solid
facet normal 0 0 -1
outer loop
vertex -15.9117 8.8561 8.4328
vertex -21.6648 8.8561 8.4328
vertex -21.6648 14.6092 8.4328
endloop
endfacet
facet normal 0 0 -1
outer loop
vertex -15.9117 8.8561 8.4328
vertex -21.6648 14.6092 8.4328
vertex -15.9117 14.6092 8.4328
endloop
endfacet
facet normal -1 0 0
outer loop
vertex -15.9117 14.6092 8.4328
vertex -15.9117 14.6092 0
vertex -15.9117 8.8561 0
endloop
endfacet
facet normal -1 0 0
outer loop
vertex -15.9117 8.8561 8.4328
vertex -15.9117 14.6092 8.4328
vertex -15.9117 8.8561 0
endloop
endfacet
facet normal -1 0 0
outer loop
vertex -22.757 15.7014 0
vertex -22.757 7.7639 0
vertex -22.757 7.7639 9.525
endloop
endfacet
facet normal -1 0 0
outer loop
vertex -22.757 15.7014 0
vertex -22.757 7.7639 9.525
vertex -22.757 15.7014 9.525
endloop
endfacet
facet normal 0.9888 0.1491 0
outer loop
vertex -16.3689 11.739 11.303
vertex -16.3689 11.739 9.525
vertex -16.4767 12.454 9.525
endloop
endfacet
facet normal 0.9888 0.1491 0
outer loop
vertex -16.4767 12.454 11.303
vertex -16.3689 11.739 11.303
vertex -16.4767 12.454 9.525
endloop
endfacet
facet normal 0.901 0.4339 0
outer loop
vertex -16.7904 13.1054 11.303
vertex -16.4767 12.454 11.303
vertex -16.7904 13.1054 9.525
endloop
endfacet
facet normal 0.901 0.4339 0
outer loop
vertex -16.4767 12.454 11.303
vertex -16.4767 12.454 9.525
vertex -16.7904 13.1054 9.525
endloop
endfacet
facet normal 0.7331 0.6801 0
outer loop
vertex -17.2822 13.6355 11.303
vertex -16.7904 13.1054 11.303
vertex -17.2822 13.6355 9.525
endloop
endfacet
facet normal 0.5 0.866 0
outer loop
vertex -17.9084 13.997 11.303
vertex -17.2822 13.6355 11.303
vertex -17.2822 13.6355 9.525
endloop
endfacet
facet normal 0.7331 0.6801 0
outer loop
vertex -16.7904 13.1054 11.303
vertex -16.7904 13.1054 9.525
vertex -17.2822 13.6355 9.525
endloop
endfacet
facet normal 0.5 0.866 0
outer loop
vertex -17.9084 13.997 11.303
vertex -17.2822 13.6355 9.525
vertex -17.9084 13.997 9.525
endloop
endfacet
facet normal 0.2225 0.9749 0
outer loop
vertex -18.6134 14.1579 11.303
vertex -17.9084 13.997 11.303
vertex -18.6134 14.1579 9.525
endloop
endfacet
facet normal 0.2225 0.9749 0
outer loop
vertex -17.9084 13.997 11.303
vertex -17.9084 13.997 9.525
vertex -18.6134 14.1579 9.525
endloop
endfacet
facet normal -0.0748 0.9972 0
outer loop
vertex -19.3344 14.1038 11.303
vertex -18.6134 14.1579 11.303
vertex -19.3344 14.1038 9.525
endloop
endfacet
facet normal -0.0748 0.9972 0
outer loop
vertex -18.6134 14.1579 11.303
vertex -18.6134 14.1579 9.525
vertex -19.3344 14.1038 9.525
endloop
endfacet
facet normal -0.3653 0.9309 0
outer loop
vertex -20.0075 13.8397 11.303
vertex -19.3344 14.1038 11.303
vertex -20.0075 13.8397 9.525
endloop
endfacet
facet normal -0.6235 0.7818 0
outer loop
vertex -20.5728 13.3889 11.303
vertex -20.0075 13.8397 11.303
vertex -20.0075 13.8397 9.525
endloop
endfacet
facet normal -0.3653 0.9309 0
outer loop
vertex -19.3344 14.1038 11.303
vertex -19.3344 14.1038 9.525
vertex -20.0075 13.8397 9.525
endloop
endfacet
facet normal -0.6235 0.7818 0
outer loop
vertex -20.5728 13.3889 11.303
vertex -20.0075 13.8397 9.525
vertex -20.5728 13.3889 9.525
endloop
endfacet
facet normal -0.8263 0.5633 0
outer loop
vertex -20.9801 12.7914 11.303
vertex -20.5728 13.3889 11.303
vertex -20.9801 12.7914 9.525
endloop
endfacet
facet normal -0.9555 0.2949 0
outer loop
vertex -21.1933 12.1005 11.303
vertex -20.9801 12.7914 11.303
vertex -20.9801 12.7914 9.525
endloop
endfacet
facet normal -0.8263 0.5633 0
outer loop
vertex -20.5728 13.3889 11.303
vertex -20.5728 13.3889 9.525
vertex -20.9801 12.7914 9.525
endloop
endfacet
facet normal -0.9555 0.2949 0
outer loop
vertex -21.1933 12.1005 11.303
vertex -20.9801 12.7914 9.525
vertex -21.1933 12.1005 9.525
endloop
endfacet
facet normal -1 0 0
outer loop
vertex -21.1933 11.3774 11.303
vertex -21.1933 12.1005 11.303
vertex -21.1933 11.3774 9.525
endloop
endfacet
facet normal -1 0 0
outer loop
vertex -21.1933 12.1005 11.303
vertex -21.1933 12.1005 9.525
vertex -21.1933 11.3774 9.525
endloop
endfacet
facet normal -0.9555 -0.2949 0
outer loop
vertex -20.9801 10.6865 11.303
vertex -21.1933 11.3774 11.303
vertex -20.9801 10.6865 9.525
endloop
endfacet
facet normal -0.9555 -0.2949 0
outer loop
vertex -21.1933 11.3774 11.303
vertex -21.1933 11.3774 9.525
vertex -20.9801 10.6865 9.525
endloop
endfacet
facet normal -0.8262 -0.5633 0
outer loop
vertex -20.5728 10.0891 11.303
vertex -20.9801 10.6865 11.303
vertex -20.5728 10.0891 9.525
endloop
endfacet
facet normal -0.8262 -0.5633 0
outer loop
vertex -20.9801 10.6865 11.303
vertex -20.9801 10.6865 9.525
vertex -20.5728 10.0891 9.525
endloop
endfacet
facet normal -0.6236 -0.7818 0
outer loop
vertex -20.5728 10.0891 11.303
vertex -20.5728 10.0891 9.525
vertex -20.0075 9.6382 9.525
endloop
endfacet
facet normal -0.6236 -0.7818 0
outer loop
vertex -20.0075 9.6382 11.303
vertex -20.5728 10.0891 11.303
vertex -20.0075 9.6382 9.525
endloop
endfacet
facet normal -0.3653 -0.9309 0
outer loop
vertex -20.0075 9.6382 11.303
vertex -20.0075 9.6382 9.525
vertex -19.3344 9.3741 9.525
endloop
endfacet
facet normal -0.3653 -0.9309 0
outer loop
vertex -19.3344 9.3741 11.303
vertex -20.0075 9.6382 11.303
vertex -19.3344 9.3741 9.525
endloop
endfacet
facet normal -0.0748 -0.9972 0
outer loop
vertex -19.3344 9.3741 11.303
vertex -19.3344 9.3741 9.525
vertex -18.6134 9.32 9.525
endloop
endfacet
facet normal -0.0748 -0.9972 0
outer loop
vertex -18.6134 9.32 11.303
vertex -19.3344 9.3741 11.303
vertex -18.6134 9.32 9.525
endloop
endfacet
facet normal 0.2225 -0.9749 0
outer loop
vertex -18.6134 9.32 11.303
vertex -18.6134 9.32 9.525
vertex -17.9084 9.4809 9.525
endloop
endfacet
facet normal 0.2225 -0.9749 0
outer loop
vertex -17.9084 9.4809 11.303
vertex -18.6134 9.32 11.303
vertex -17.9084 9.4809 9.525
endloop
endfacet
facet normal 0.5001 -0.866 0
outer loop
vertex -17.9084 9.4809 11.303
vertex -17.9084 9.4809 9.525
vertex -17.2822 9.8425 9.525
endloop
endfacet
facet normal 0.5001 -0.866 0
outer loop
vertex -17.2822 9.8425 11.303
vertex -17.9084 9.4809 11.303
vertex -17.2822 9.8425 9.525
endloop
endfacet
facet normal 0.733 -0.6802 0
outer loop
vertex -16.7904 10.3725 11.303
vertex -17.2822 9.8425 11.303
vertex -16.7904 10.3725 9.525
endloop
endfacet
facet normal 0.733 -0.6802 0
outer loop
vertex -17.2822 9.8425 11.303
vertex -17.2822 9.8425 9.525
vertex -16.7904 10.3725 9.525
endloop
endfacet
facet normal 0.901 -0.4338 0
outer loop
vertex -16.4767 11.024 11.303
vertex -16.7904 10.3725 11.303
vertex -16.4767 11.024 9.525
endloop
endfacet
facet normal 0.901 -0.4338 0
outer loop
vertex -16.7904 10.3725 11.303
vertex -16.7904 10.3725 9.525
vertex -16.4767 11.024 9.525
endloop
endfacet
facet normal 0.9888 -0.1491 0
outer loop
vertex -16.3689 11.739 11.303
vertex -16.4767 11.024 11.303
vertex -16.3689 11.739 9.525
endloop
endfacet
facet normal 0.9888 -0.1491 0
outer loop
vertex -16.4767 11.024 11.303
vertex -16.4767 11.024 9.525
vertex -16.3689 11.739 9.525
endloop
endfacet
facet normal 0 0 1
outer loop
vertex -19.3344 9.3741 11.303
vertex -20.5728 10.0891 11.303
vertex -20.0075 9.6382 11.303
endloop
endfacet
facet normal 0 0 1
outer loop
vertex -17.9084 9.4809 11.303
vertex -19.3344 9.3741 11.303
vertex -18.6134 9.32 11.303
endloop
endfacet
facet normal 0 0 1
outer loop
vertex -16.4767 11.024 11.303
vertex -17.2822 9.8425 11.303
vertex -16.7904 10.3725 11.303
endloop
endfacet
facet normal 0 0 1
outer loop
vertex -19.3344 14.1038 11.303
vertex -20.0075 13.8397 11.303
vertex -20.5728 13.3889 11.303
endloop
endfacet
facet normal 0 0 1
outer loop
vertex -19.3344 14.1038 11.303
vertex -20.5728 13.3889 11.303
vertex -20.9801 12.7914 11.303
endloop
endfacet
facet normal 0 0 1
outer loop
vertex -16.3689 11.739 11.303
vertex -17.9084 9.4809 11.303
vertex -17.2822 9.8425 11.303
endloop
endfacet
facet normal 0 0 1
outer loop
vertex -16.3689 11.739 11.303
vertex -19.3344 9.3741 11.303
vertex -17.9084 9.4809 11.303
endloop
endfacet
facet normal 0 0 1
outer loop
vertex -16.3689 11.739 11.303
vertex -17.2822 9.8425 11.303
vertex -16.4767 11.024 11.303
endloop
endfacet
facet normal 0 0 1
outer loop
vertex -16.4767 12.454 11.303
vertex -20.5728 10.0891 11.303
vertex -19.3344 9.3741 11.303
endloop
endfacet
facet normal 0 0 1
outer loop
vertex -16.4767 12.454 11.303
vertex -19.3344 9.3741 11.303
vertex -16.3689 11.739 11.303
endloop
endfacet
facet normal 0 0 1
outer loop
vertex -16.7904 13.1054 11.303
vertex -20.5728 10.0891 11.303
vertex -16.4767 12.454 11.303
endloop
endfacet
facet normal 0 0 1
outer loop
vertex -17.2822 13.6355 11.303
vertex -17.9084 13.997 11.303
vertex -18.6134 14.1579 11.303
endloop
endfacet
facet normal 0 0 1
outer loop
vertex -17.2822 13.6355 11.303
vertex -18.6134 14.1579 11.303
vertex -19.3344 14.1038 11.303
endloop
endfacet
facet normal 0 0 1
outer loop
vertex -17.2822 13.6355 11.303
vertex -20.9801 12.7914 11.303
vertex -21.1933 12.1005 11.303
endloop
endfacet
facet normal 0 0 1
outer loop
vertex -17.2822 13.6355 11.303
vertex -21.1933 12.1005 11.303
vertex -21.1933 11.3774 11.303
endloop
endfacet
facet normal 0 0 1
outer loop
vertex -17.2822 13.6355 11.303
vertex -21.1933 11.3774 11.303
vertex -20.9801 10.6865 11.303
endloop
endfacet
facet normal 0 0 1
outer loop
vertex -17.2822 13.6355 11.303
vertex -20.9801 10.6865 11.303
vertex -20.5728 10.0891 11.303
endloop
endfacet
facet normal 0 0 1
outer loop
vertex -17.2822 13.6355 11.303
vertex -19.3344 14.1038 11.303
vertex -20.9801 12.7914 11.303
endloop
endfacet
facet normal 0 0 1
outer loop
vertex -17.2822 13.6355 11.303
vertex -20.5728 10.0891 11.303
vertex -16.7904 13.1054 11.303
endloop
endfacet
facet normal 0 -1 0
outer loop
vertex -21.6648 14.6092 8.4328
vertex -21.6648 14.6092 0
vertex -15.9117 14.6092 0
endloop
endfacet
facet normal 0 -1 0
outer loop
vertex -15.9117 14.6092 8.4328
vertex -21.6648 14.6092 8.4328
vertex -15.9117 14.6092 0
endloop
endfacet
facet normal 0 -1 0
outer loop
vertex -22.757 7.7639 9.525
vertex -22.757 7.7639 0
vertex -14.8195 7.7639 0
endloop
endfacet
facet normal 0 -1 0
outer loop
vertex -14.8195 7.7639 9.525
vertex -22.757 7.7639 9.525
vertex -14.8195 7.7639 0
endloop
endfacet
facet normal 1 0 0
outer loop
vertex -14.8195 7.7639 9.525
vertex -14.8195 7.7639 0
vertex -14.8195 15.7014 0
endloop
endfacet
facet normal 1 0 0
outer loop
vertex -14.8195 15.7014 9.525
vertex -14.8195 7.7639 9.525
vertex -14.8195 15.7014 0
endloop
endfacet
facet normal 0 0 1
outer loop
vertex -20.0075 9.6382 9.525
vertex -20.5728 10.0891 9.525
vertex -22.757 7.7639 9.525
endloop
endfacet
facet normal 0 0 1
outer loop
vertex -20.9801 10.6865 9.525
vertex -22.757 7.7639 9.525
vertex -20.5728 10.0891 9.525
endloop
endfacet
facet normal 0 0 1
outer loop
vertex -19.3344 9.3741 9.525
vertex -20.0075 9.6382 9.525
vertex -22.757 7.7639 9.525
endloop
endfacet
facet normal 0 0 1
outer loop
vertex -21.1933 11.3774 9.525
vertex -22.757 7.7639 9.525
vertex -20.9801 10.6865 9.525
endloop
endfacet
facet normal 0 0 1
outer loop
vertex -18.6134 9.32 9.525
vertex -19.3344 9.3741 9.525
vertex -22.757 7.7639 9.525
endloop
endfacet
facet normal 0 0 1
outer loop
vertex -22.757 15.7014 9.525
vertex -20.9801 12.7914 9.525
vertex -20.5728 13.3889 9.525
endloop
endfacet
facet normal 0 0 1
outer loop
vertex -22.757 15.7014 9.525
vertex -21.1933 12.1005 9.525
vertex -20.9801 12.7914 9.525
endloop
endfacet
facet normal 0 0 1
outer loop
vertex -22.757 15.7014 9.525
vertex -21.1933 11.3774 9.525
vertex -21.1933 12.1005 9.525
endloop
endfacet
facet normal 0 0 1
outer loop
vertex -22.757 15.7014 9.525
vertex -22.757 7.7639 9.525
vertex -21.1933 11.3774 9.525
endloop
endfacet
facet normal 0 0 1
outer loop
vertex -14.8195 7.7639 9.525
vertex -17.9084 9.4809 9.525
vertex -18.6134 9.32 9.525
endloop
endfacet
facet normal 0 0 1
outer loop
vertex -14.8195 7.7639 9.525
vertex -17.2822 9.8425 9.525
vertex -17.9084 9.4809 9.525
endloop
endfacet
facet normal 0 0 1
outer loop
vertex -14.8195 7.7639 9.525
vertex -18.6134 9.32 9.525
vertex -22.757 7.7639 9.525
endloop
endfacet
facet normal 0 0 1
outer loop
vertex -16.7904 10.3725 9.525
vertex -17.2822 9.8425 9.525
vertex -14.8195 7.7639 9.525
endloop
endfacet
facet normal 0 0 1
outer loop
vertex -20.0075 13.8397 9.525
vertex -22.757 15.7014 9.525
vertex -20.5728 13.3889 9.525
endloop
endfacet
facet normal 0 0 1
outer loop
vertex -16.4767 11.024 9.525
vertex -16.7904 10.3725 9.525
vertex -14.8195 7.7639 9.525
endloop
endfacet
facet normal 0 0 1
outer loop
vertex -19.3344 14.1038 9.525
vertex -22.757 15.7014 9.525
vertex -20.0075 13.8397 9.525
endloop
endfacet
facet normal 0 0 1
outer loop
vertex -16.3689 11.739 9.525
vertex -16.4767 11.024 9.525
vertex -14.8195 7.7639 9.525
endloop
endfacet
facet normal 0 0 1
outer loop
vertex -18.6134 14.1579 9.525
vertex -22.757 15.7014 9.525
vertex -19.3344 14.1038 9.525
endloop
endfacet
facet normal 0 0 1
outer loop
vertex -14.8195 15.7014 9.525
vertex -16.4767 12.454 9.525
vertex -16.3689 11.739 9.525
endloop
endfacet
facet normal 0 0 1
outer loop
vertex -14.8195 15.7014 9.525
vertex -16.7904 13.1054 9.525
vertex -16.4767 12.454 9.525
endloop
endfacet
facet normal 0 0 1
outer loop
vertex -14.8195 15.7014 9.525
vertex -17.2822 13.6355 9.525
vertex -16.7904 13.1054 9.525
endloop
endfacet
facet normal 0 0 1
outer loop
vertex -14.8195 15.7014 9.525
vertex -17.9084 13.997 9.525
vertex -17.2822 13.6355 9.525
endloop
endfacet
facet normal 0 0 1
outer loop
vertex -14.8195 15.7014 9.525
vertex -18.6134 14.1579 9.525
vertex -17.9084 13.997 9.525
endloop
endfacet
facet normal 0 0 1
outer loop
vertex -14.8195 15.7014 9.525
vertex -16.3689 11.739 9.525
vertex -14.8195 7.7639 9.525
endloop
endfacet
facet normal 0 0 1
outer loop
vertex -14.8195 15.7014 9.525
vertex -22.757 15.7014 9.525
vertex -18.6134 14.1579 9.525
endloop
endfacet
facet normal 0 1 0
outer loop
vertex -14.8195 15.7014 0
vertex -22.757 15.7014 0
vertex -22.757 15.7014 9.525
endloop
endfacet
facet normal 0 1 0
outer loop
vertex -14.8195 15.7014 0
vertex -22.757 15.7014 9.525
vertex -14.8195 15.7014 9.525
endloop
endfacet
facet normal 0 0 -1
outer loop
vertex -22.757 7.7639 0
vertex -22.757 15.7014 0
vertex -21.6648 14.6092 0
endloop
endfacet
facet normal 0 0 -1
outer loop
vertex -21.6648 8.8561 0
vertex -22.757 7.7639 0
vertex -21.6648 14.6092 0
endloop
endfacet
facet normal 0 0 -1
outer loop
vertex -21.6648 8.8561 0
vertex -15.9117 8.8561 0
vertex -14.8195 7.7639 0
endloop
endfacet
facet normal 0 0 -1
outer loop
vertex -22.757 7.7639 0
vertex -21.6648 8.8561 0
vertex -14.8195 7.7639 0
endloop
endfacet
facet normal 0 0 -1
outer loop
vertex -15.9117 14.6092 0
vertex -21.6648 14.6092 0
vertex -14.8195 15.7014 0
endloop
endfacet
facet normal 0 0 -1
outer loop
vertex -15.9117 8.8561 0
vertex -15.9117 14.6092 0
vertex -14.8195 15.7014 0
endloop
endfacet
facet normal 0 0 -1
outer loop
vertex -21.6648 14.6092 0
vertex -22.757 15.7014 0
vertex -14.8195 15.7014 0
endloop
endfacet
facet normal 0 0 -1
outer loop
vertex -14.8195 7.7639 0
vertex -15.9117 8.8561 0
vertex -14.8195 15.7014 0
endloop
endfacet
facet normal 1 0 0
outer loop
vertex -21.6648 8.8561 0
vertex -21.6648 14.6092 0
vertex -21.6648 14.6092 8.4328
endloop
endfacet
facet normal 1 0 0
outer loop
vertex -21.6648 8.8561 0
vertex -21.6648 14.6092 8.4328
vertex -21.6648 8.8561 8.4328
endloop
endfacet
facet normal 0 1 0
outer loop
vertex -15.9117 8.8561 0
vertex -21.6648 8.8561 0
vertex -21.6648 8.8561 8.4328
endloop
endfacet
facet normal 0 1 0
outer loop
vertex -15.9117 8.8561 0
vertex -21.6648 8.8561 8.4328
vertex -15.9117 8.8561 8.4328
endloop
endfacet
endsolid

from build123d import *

# Parameters (mm, degrees)
F0_W     = 7.9375
F0_H     = 7.9375
F1_DEPTH = 9.525
F2_R     = 2.4257
F3_DEPTH = 1.778
F4_W     = 5.7531
F4_H     = 5.7531
F5_DEPTH = 8.4328


with BuildPart() as f1:
    # F0 (on Top) → F1 (new body)
    with BuildSketch(Plane.XY):
        with Locations((-18.788291, 11.73261)):
            Rectangle(F0_W, F0_H)
    extrude(amount=F1_DEPTH)

    # F2 (on face) → F3 (join)
    with BuildSketch(Plane.XY.offset(9.525)):
        with Locations((-18.794646, 11.738965)):
            Circle(F2_R)
    extrude(amount=F3_DEPTH)

    # F4 (on face) → F5 (cut)
    with BuildSketch(Plane(origin=(0, 0, 0), x_dir=(1, 0, 0), z_dir=(0, 0, -1))):
        with Locations((-18.788291, -11.73261)):
            Rectangle(F4_W, F4_H)
    extrude(amount=-F5_DEPTH, mode=Mode.SUBTRACT)


solid = f1.part
